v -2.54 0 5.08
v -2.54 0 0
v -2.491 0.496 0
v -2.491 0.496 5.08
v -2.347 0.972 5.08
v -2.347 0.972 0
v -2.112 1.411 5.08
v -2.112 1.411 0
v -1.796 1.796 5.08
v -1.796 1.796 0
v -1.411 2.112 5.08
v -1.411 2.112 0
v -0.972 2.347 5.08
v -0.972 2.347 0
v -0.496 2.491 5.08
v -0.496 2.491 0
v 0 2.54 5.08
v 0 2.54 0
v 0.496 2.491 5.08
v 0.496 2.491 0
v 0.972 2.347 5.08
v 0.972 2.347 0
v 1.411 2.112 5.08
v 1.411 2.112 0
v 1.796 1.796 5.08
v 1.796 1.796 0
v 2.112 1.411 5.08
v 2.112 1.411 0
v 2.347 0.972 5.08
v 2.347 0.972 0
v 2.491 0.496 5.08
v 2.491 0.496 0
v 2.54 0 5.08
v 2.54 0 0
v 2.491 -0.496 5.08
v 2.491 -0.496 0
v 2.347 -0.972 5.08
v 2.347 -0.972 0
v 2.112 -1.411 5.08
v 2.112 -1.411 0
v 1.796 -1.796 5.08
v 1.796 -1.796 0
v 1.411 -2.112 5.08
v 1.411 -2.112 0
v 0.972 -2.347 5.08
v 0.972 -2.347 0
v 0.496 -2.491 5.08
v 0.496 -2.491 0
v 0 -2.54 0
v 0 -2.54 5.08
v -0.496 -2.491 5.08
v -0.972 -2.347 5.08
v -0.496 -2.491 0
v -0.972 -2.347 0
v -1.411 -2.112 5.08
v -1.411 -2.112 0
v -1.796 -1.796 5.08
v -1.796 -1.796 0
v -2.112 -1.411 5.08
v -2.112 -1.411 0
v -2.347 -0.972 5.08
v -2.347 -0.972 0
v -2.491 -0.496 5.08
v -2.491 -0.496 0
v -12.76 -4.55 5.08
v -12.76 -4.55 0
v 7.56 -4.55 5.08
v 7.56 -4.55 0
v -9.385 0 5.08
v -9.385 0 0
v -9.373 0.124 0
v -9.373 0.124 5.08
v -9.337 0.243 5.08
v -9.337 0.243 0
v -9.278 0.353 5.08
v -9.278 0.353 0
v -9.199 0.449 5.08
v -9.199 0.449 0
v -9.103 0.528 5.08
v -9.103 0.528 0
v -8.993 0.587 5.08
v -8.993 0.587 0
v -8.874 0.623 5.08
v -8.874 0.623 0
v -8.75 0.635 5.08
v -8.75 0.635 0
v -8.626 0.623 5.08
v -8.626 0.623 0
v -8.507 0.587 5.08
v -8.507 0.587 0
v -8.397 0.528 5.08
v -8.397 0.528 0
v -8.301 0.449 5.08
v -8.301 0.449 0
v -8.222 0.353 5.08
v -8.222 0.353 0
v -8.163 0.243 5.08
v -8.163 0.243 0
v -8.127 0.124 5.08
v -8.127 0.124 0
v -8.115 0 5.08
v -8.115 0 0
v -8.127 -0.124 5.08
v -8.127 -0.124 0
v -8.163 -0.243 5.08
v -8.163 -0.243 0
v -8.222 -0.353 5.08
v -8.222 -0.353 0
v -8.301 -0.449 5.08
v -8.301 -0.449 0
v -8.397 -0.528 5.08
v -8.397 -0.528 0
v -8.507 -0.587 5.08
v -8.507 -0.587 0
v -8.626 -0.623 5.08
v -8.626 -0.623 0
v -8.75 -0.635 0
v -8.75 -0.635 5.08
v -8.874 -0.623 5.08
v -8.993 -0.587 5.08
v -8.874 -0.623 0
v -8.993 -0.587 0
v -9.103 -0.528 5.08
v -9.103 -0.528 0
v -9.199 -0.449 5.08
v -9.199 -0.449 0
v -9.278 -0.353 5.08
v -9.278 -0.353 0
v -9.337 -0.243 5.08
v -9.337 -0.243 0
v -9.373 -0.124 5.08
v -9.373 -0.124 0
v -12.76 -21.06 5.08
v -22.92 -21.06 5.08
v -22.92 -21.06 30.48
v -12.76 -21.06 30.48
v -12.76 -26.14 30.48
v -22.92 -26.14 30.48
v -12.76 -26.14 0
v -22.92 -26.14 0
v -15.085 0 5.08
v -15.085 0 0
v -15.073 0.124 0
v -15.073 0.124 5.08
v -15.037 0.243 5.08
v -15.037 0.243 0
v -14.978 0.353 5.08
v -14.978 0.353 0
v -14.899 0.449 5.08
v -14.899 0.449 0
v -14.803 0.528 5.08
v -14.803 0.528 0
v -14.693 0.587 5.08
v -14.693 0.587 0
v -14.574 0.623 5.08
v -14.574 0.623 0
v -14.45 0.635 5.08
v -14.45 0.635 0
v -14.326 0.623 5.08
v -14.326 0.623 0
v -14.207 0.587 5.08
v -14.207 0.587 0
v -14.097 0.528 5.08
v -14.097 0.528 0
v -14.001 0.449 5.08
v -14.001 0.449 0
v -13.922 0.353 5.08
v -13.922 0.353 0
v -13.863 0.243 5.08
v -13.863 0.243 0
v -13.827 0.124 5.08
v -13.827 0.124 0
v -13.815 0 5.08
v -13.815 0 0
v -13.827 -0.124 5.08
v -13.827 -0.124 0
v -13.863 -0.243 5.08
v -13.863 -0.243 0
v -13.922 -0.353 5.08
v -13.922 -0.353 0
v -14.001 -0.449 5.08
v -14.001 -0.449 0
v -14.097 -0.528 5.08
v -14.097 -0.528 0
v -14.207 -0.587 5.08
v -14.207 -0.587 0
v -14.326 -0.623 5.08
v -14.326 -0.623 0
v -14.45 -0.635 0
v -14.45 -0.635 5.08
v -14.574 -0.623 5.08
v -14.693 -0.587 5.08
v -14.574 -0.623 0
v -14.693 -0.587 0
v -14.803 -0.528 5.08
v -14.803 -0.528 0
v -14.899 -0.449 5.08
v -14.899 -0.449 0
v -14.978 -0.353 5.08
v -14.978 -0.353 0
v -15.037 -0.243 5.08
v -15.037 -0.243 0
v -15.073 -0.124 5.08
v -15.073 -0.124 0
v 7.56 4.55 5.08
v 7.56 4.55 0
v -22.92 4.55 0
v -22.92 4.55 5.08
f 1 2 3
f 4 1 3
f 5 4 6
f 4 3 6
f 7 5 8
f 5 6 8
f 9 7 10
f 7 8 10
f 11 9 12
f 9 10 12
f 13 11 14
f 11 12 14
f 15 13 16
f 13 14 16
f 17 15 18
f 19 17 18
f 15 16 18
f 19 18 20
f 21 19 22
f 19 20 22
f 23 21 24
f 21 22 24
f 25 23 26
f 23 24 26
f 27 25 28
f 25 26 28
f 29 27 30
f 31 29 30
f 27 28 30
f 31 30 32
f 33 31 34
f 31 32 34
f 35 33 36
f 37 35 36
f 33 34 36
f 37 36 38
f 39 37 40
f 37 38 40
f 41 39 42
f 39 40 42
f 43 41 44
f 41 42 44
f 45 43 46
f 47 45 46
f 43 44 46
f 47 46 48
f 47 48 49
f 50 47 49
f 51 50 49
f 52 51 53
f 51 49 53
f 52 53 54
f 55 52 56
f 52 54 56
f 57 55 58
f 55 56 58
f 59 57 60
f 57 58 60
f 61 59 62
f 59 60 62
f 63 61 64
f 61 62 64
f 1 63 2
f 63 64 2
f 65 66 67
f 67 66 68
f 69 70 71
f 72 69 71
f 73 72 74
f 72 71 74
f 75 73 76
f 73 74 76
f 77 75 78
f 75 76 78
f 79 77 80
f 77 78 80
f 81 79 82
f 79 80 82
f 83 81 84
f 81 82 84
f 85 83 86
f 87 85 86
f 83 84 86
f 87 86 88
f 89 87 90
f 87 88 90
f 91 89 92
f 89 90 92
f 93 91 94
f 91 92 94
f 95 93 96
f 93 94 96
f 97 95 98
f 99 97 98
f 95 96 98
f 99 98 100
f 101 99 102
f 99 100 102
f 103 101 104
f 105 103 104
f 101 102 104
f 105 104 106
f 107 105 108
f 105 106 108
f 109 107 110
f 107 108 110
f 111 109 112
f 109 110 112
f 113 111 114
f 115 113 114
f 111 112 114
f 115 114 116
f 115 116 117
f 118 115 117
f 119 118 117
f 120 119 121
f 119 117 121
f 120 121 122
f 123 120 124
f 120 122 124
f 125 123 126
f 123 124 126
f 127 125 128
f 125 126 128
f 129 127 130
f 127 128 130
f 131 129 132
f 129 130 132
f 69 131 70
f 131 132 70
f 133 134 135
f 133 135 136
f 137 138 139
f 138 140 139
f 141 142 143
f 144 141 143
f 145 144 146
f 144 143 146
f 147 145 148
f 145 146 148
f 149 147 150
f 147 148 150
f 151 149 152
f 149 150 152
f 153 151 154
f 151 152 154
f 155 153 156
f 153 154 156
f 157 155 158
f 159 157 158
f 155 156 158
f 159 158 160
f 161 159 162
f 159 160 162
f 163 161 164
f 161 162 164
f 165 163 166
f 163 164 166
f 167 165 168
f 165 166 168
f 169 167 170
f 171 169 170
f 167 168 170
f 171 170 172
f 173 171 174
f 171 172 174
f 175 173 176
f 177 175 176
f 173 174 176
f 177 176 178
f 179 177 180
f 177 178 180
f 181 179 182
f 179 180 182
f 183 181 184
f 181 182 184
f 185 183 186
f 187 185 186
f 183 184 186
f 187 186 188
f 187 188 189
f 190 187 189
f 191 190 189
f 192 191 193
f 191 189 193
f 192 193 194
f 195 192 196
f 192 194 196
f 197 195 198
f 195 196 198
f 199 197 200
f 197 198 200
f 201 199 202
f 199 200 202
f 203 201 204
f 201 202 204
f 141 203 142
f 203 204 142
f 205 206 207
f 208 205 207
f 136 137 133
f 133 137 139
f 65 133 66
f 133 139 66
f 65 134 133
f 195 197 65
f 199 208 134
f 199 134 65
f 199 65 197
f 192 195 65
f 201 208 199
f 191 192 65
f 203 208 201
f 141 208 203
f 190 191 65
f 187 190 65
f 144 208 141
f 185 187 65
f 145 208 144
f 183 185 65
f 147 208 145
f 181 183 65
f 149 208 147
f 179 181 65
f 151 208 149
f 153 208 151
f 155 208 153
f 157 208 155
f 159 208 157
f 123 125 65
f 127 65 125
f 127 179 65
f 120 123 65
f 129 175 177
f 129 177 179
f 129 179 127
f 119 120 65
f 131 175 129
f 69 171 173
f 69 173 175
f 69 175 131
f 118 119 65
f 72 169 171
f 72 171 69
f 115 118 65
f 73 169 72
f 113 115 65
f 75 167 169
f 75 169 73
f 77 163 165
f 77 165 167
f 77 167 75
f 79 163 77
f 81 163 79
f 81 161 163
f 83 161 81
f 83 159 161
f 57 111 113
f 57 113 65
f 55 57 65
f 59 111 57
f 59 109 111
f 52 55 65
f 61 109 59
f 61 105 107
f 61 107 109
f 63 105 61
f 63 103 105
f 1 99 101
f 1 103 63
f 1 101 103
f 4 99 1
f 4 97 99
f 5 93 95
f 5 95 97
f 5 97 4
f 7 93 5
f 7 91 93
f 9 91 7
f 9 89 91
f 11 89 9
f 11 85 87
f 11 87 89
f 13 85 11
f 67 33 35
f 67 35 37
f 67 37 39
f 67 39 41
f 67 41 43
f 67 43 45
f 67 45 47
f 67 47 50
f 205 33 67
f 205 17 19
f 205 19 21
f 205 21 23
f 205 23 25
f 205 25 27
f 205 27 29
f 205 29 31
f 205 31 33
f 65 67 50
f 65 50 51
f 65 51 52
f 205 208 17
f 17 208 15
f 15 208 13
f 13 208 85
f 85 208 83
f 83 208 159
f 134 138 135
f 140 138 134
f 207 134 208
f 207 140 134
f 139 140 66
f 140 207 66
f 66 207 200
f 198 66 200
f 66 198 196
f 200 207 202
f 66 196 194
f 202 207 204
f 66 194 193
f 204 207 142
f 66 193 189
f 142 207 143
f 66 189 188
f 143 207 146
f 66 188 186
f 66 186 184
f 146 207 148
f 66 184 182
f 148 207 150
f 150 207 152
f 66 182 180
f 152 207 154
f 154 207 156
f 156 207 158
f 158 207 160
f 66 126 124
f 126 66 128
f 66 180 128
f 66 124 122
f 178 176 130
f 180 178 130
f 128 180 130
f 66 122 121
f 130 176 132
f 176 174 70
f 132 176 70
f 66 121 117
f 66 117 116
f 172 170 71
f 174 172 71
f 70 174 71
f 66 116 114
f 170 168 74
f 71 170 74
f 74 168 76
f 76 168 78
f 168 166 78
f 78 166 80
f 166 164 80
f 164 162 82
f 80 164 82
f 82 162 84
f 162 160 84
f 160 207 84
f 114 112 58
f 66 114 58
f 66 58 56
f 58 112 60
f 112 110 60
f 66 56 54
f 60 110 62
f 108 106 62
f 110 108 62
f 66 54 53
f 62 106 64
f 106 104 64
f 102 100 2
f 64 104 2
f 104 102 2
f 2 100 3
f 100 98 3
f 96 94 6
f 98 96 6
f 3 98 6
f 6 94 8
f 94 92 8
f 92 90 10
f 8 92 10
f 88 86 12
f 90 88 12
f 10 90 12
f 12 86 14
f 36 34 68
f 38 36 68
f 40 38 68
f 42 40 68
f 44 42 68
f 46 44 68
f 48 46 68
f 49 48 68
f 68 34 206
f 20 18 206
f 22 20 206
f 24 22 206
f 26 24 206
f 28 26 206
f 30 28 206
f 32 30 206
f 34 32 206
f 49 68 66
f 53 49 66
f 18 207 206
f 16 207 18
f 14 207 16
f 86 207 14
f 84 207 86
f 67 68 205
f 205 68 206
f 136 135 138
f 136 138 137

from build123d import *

# Parameters (mm, degrees)
BOSS_EXTRUDE1_DEPTH = 5.08
SKETCH4_W           = 10.16
SKETCH4_H           = 5.08
BOSS_EXTRUDE2_DEPTH = 25.4
SKETCH2_R           = 0.635
SKETCH2_R_2         = 2.54
CUT_EXTRUDE1_DEPTH  = 5.08


with BuildPart() as part:
    # Sketch1 → Boss-Extrude1 (new body)
    with BuildSketch(Plane.XY):
        Polygon((-22.92, -4.55), (-22.92, -26.14), (-12.76, -26.14), (-12.76, -4.55), (7.56, -4.55), (7.56, 4.55), (-22.92, 4.55), align=None)
    extrude(amount=BOSS_EXTRUDE1_DEPTH)

    # Sketch4 → Boss-Extrude2 (add)
    with BuildSketch(Plane.XY.offset(5.08)):
        with Locations((-17.84, -23.6)):
            Rectangle(SKETCH4_W, SKETCH4_H)
    extrude(amount=BOSS_EXTRUDE2_DEPTH)

    # Sketch2 → Cut-Extrude1 (cut)
    with BuildSketch(Plane(origin=(0, 0, 0), x_dir=(-1, 0, 0), z_dir=(0, 0, -1))):
        with Locations((14.45, 0)):
            Circle(SKETCH2_R)
        Circle(SKETCH2_R_2)
        with Locations((8.75, 0)):
            Circle(SKETCH2_R)
    extrude(amount=-CUT_EXTRUDE1_DEPTH, mode=Mode.SUBTRACT)


solid = part.part
